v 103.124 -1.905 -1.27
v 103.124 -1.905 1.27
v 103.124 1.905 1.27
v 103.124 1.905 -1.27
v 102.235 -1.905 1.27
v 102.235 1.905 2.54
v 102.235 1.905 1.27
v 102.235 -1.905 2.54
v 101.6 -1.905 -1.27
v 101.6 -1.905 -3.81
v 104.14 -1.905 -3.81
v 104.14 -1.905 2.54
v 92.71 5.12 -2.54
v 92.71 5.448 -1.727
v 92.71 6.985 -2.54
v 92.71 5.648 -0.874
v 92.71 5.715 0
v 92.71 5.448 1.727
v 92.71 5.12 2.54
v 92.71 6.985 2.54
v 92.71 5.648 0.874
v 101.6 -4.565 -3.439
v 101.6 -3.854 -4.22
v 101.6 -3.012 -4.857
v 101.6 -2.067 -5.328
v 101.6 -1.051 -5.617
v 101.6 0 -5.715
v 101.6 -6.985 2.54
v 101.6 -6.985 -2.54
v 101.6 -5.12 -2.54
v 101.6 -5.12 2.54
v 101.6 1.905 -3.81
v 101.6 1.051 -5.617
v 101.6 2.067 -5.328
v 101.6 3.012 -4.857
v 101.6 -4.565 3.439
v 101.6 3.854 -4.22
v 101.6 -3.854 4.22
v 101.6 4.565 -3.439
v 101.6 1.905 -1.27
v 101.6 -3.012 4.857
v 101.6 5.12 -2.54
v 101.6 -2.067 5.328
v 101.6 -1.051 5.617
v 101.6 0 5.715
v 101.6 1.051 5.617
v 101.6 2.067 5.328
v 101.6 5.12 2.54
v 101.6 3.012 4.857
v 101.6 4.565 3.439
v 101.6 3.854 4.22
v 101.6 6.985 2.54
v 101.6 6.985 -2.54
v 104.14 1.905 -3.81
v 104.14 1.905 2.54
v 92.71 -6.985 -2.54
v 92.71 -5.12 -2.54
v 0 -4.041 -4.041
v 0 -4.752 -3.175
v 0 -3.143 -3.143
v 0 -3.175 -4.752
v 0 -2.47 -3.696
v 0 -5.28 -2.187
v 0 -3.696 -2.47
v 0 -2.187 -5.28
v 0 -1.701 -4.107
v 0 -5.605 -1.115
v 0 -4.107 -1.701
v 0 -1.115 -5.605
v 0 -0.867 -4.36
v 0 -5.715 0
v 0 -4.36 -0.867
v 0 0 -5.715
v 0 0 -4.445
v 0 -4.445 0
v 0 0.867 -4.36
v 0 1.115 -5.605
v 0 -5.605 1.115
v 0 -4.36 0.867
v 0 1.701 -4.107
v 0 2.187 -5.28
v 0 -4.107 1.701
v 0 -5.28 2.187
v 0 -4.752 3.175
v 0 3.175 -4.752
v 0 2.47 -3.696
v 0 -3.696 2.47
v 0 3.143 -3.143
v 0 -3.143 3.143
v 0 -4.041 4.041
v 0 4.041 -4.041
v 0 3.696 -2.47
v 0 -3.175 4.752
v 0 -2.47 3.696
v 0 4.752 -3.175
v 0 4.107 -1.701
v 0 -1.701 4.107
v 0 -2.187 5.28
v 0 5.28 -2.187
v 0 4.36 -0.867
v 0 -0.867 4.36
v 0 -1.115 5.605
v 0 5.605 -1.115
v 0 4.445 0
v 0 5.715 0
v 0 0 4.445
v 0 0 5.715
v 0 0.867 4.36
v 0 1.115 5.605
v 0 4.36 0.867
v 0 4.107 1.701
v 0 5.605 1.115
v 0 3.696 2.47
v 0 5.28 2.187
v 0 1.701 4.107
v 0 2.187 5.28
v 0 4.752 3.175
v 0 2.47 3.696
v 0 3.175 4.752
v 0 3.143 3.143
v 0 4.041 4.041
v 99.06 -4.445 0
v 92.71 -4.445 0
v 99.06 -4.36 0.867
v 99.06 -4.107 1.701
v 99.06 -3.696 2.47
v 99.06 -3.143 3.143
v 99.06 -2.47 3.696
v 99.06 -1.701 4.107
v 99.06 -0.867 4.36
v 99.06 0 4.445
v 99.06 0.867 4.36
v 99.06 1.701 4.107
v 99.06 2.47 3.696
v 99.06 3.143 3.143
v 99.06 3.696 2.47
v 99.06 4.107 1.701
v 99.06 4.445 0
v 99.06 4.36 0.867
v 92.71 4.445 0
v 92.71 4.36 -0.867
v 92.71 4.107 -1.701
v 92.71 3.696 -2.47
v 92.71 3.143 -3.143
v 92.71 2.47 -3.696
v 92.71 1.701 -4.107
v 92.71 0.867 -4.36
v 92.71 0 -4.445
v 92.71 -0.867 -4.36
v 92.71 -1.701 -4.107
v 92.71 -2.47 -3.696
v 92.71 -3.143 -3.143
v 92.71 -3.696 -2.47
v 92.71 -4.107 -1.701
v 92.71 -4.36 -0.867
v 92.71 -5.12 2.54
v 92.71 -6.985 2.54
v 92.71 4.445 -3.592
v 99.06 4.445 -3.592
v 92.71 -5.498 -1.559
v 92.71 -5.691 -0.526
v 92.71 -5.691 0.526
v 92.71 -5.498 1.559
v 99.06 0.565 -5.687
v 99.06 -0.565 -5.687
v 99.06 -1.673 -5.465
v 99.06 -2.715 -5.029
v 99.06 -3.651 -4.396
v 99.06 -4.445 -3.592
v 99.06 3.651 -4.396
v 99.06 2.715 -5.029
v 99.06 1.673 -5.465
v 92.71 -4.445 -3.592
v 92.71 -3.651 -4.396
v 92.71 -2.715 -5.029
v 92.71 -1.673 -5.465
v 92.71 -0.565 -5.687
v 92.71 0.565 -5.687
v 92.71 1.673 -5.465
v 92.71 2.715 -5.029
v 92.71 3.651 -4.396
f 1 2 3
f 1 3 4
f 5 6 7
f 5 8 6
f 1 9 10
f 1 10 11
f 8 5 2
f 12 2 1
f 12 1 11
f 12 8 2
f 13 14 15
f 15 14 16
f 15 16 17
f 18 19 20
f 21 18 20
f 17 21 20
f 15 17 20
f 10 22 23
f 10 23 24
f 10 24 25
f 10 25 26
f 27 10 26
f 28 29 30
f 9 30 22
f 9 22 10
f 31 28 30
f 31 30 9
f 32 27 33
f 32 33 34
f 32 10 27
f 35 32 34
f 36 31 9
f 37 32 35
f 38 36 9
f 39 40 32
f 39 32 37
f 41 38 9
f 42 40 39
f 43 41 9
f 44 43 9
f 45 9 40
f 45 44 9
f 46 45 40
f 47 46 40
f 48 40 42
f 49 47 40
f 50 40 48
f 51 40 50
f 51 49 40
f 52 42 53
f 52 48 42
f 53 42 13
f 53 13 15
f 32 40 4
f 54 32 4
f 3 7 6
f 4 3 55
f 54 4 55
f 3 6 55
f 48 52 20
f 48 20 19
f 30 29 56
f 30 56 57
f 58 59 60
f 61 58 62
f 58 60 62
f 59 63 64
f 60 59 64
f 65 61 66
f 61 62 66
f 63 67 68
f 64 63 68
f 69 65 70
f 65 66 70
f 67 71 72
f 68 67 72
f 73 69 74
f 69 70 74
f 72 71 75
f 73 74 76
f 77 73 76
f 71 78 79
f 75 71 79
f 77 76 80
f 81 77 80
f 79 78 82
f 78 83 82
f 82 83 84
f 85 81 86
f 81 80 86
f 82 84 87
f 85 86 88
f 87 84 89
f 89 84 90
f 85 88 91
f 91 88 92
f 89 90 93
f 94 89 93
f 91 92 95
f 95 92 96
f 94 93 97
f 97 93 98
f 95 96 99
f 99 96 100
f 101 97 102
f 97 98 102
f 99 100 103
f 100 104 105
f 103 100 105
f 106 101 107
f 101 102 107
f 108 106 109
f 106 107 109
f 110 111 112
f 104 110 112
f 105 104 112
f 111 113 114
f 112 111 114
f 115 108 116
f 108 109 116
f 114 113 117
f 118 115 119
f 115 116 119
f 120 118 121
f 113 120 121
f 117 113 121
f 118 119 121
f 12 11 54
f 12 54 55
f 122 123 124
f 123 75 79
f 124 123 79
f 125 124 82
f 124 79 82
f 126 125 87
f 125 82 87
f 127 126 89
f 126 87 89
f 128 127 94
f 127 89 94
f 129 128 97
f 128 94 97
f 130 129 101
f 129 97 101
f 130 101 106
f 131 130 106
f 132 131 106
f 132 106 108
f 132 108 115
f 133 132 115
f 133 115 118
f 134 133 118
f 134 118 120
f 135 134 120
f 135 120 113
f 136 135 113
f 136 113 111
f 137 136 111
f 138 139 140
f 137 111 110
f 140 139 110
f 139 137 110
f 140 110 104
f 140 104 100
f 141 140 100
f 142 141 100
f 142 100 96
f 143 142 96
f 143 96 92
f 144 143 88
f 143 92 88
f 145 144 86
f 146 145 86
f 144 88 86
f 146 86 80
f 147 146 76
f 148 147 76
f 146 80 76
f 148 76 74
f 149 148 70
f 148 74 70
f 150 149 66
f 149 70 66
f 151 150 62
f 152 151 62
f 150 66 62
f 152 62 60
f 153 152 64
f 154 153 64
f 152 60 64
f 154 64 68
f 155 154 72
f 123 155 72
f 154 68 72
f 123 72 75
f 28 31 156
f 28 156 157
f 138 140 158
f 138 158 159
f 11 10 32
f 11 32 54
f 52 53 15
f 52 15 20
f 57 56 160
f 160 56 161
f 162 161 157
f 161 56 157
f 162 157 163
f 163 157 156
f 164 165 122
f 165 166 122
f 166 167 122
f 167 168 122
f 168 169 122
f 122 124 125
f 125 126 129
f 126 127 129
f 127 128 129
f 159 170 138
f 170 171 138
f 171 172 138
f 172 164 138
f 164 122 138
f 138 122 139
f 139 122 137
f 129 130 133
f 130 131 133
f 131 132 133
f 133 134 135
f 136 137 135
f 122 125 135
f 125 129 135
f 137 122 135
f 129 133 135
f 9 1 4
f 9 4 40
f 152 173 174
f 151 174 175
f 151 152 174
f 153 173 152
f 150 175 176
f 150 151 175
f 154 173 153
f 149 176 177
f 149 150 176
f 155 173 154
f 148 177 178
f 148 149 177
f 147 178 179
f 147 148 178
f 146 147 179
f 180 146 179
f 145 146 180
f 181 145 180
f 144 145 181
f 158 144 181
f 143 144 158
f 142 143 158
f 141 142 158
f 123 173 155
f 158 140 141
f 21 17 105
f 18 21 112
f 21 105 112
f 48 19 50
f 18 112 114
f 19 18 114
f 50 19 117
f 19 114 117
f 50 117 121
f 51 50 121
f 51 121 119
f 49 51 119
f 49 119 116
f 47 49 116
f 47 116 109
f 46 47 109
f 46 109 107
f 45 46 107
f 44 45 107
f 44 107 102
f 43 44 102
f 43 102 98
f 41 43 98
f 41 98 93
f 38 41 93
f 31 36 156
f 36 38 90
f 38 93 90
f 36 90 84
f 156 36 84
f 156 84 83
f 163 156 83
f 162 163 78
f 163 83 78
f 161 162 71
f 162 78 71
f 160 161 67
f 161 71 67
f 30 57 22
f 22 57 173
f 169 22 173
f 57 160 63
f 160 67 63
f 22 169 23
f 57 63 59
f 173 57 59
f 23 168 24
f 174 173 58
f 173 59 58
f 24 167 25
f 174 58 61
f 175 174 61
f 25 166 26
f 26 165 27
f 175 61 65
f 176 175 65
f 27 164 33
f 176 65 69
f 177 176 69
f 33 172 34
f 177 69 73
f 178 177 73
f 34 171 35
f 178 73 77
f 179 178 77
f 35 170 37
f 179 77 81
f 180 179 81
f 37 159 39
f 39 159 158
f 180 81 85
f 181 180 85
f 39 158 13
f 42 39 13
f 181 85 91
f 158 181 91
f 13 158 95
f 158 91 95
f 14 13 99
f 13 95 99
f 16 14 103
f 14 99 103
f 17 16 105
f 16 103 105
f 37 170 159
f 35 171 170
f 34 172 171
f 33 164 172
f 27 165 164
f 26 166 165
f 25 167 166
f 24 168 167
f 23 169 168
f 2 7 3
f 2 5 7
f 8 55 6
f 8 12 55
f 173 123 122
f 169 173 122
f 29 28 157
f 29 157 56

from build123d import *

# Parameters (mm, degrees)
F0_R           = 5.715
F1_DEPTH       = 101.6
F2_R           = 4.445
F3_DEPTH       = 99.06
F4_W           = 6.35
F4_H           = 8.89
F5_DEPTH       = 25.4
F8_DEPTH       = 8.89
F10_DEPTH      = 1.905
F10_DEPTH_BACK = 1.905


with BuildPart() as f1:
    # F0 (on Right) → F1 (new body)
    with BuildSketch(Plane.YZ):
        Circle(F0_R)
    extrude(amount=F1_DEPTH)

    # F2 (on face) → F3 (cut)
    with BuildSketch(Plane(origin=(0, 0, 0), x_dir=(0, -1, 0), z_dir=(-1, 0, 0))):
        Circle(F2_R)
    extrude(amount=-F3_DEPTH, mode=Mode.SUBTRACT)

    # F4 (on Top) → F5 (cut)
    with BuildSketch(Plane.XY):
        with Locations((95.885, 0)):
            Rectangle(F4_W, F4_H)
    extrude(amount=-F5_DEPTH, mode=Mode.SUBTRACT)

    # F7 (on offset) → F8 (join)
    with BuildSketch(Plane.YZ.offset(101.6)):
        with BuildLine():
            Line((6.985, 2.54), (5.119534, 2.54))
            ThreePointArc((5.119534, 2.54), (5.715, 0), (5.119534, -2.54))
            Line((5.119534, -2.54), (6.985, -2.54))
            Line((6.985, -2.54), (6.985, 2.54))
        make_face()
        with BuildLine():
            Line((-6.985, -2.54), (-5.119534, -2.54))
            ThreePointArc((-5.119534, -2.54), (-5.715, 0), (-5.119534, 2.54))
            Line((-5.119534, 2.54), (-6.985, 2.54))
            Line((-6.985, 2.54), (-6.985, -2.54))
        make_face()
    extrude(amount=-F8_DEPTH)

    # F9 (on Front) → F10 (join, two sides)
    with BuildSketch(Plane.XZ) as f10_sk:
        Polygon((102.235, 1.27), (103.124, 1.27), (103.124, -1.27), (101.6, -1.27), (101.6, -3.81), (104.14, -3.81), (104.14, 2.54), (102.235, 2.54), align=None)
    extrude(amount=F10_DEPTH)
    extrude(f10_sk.sketch, amount=-F10_DEPTH_BACK)


solid = f1.part
